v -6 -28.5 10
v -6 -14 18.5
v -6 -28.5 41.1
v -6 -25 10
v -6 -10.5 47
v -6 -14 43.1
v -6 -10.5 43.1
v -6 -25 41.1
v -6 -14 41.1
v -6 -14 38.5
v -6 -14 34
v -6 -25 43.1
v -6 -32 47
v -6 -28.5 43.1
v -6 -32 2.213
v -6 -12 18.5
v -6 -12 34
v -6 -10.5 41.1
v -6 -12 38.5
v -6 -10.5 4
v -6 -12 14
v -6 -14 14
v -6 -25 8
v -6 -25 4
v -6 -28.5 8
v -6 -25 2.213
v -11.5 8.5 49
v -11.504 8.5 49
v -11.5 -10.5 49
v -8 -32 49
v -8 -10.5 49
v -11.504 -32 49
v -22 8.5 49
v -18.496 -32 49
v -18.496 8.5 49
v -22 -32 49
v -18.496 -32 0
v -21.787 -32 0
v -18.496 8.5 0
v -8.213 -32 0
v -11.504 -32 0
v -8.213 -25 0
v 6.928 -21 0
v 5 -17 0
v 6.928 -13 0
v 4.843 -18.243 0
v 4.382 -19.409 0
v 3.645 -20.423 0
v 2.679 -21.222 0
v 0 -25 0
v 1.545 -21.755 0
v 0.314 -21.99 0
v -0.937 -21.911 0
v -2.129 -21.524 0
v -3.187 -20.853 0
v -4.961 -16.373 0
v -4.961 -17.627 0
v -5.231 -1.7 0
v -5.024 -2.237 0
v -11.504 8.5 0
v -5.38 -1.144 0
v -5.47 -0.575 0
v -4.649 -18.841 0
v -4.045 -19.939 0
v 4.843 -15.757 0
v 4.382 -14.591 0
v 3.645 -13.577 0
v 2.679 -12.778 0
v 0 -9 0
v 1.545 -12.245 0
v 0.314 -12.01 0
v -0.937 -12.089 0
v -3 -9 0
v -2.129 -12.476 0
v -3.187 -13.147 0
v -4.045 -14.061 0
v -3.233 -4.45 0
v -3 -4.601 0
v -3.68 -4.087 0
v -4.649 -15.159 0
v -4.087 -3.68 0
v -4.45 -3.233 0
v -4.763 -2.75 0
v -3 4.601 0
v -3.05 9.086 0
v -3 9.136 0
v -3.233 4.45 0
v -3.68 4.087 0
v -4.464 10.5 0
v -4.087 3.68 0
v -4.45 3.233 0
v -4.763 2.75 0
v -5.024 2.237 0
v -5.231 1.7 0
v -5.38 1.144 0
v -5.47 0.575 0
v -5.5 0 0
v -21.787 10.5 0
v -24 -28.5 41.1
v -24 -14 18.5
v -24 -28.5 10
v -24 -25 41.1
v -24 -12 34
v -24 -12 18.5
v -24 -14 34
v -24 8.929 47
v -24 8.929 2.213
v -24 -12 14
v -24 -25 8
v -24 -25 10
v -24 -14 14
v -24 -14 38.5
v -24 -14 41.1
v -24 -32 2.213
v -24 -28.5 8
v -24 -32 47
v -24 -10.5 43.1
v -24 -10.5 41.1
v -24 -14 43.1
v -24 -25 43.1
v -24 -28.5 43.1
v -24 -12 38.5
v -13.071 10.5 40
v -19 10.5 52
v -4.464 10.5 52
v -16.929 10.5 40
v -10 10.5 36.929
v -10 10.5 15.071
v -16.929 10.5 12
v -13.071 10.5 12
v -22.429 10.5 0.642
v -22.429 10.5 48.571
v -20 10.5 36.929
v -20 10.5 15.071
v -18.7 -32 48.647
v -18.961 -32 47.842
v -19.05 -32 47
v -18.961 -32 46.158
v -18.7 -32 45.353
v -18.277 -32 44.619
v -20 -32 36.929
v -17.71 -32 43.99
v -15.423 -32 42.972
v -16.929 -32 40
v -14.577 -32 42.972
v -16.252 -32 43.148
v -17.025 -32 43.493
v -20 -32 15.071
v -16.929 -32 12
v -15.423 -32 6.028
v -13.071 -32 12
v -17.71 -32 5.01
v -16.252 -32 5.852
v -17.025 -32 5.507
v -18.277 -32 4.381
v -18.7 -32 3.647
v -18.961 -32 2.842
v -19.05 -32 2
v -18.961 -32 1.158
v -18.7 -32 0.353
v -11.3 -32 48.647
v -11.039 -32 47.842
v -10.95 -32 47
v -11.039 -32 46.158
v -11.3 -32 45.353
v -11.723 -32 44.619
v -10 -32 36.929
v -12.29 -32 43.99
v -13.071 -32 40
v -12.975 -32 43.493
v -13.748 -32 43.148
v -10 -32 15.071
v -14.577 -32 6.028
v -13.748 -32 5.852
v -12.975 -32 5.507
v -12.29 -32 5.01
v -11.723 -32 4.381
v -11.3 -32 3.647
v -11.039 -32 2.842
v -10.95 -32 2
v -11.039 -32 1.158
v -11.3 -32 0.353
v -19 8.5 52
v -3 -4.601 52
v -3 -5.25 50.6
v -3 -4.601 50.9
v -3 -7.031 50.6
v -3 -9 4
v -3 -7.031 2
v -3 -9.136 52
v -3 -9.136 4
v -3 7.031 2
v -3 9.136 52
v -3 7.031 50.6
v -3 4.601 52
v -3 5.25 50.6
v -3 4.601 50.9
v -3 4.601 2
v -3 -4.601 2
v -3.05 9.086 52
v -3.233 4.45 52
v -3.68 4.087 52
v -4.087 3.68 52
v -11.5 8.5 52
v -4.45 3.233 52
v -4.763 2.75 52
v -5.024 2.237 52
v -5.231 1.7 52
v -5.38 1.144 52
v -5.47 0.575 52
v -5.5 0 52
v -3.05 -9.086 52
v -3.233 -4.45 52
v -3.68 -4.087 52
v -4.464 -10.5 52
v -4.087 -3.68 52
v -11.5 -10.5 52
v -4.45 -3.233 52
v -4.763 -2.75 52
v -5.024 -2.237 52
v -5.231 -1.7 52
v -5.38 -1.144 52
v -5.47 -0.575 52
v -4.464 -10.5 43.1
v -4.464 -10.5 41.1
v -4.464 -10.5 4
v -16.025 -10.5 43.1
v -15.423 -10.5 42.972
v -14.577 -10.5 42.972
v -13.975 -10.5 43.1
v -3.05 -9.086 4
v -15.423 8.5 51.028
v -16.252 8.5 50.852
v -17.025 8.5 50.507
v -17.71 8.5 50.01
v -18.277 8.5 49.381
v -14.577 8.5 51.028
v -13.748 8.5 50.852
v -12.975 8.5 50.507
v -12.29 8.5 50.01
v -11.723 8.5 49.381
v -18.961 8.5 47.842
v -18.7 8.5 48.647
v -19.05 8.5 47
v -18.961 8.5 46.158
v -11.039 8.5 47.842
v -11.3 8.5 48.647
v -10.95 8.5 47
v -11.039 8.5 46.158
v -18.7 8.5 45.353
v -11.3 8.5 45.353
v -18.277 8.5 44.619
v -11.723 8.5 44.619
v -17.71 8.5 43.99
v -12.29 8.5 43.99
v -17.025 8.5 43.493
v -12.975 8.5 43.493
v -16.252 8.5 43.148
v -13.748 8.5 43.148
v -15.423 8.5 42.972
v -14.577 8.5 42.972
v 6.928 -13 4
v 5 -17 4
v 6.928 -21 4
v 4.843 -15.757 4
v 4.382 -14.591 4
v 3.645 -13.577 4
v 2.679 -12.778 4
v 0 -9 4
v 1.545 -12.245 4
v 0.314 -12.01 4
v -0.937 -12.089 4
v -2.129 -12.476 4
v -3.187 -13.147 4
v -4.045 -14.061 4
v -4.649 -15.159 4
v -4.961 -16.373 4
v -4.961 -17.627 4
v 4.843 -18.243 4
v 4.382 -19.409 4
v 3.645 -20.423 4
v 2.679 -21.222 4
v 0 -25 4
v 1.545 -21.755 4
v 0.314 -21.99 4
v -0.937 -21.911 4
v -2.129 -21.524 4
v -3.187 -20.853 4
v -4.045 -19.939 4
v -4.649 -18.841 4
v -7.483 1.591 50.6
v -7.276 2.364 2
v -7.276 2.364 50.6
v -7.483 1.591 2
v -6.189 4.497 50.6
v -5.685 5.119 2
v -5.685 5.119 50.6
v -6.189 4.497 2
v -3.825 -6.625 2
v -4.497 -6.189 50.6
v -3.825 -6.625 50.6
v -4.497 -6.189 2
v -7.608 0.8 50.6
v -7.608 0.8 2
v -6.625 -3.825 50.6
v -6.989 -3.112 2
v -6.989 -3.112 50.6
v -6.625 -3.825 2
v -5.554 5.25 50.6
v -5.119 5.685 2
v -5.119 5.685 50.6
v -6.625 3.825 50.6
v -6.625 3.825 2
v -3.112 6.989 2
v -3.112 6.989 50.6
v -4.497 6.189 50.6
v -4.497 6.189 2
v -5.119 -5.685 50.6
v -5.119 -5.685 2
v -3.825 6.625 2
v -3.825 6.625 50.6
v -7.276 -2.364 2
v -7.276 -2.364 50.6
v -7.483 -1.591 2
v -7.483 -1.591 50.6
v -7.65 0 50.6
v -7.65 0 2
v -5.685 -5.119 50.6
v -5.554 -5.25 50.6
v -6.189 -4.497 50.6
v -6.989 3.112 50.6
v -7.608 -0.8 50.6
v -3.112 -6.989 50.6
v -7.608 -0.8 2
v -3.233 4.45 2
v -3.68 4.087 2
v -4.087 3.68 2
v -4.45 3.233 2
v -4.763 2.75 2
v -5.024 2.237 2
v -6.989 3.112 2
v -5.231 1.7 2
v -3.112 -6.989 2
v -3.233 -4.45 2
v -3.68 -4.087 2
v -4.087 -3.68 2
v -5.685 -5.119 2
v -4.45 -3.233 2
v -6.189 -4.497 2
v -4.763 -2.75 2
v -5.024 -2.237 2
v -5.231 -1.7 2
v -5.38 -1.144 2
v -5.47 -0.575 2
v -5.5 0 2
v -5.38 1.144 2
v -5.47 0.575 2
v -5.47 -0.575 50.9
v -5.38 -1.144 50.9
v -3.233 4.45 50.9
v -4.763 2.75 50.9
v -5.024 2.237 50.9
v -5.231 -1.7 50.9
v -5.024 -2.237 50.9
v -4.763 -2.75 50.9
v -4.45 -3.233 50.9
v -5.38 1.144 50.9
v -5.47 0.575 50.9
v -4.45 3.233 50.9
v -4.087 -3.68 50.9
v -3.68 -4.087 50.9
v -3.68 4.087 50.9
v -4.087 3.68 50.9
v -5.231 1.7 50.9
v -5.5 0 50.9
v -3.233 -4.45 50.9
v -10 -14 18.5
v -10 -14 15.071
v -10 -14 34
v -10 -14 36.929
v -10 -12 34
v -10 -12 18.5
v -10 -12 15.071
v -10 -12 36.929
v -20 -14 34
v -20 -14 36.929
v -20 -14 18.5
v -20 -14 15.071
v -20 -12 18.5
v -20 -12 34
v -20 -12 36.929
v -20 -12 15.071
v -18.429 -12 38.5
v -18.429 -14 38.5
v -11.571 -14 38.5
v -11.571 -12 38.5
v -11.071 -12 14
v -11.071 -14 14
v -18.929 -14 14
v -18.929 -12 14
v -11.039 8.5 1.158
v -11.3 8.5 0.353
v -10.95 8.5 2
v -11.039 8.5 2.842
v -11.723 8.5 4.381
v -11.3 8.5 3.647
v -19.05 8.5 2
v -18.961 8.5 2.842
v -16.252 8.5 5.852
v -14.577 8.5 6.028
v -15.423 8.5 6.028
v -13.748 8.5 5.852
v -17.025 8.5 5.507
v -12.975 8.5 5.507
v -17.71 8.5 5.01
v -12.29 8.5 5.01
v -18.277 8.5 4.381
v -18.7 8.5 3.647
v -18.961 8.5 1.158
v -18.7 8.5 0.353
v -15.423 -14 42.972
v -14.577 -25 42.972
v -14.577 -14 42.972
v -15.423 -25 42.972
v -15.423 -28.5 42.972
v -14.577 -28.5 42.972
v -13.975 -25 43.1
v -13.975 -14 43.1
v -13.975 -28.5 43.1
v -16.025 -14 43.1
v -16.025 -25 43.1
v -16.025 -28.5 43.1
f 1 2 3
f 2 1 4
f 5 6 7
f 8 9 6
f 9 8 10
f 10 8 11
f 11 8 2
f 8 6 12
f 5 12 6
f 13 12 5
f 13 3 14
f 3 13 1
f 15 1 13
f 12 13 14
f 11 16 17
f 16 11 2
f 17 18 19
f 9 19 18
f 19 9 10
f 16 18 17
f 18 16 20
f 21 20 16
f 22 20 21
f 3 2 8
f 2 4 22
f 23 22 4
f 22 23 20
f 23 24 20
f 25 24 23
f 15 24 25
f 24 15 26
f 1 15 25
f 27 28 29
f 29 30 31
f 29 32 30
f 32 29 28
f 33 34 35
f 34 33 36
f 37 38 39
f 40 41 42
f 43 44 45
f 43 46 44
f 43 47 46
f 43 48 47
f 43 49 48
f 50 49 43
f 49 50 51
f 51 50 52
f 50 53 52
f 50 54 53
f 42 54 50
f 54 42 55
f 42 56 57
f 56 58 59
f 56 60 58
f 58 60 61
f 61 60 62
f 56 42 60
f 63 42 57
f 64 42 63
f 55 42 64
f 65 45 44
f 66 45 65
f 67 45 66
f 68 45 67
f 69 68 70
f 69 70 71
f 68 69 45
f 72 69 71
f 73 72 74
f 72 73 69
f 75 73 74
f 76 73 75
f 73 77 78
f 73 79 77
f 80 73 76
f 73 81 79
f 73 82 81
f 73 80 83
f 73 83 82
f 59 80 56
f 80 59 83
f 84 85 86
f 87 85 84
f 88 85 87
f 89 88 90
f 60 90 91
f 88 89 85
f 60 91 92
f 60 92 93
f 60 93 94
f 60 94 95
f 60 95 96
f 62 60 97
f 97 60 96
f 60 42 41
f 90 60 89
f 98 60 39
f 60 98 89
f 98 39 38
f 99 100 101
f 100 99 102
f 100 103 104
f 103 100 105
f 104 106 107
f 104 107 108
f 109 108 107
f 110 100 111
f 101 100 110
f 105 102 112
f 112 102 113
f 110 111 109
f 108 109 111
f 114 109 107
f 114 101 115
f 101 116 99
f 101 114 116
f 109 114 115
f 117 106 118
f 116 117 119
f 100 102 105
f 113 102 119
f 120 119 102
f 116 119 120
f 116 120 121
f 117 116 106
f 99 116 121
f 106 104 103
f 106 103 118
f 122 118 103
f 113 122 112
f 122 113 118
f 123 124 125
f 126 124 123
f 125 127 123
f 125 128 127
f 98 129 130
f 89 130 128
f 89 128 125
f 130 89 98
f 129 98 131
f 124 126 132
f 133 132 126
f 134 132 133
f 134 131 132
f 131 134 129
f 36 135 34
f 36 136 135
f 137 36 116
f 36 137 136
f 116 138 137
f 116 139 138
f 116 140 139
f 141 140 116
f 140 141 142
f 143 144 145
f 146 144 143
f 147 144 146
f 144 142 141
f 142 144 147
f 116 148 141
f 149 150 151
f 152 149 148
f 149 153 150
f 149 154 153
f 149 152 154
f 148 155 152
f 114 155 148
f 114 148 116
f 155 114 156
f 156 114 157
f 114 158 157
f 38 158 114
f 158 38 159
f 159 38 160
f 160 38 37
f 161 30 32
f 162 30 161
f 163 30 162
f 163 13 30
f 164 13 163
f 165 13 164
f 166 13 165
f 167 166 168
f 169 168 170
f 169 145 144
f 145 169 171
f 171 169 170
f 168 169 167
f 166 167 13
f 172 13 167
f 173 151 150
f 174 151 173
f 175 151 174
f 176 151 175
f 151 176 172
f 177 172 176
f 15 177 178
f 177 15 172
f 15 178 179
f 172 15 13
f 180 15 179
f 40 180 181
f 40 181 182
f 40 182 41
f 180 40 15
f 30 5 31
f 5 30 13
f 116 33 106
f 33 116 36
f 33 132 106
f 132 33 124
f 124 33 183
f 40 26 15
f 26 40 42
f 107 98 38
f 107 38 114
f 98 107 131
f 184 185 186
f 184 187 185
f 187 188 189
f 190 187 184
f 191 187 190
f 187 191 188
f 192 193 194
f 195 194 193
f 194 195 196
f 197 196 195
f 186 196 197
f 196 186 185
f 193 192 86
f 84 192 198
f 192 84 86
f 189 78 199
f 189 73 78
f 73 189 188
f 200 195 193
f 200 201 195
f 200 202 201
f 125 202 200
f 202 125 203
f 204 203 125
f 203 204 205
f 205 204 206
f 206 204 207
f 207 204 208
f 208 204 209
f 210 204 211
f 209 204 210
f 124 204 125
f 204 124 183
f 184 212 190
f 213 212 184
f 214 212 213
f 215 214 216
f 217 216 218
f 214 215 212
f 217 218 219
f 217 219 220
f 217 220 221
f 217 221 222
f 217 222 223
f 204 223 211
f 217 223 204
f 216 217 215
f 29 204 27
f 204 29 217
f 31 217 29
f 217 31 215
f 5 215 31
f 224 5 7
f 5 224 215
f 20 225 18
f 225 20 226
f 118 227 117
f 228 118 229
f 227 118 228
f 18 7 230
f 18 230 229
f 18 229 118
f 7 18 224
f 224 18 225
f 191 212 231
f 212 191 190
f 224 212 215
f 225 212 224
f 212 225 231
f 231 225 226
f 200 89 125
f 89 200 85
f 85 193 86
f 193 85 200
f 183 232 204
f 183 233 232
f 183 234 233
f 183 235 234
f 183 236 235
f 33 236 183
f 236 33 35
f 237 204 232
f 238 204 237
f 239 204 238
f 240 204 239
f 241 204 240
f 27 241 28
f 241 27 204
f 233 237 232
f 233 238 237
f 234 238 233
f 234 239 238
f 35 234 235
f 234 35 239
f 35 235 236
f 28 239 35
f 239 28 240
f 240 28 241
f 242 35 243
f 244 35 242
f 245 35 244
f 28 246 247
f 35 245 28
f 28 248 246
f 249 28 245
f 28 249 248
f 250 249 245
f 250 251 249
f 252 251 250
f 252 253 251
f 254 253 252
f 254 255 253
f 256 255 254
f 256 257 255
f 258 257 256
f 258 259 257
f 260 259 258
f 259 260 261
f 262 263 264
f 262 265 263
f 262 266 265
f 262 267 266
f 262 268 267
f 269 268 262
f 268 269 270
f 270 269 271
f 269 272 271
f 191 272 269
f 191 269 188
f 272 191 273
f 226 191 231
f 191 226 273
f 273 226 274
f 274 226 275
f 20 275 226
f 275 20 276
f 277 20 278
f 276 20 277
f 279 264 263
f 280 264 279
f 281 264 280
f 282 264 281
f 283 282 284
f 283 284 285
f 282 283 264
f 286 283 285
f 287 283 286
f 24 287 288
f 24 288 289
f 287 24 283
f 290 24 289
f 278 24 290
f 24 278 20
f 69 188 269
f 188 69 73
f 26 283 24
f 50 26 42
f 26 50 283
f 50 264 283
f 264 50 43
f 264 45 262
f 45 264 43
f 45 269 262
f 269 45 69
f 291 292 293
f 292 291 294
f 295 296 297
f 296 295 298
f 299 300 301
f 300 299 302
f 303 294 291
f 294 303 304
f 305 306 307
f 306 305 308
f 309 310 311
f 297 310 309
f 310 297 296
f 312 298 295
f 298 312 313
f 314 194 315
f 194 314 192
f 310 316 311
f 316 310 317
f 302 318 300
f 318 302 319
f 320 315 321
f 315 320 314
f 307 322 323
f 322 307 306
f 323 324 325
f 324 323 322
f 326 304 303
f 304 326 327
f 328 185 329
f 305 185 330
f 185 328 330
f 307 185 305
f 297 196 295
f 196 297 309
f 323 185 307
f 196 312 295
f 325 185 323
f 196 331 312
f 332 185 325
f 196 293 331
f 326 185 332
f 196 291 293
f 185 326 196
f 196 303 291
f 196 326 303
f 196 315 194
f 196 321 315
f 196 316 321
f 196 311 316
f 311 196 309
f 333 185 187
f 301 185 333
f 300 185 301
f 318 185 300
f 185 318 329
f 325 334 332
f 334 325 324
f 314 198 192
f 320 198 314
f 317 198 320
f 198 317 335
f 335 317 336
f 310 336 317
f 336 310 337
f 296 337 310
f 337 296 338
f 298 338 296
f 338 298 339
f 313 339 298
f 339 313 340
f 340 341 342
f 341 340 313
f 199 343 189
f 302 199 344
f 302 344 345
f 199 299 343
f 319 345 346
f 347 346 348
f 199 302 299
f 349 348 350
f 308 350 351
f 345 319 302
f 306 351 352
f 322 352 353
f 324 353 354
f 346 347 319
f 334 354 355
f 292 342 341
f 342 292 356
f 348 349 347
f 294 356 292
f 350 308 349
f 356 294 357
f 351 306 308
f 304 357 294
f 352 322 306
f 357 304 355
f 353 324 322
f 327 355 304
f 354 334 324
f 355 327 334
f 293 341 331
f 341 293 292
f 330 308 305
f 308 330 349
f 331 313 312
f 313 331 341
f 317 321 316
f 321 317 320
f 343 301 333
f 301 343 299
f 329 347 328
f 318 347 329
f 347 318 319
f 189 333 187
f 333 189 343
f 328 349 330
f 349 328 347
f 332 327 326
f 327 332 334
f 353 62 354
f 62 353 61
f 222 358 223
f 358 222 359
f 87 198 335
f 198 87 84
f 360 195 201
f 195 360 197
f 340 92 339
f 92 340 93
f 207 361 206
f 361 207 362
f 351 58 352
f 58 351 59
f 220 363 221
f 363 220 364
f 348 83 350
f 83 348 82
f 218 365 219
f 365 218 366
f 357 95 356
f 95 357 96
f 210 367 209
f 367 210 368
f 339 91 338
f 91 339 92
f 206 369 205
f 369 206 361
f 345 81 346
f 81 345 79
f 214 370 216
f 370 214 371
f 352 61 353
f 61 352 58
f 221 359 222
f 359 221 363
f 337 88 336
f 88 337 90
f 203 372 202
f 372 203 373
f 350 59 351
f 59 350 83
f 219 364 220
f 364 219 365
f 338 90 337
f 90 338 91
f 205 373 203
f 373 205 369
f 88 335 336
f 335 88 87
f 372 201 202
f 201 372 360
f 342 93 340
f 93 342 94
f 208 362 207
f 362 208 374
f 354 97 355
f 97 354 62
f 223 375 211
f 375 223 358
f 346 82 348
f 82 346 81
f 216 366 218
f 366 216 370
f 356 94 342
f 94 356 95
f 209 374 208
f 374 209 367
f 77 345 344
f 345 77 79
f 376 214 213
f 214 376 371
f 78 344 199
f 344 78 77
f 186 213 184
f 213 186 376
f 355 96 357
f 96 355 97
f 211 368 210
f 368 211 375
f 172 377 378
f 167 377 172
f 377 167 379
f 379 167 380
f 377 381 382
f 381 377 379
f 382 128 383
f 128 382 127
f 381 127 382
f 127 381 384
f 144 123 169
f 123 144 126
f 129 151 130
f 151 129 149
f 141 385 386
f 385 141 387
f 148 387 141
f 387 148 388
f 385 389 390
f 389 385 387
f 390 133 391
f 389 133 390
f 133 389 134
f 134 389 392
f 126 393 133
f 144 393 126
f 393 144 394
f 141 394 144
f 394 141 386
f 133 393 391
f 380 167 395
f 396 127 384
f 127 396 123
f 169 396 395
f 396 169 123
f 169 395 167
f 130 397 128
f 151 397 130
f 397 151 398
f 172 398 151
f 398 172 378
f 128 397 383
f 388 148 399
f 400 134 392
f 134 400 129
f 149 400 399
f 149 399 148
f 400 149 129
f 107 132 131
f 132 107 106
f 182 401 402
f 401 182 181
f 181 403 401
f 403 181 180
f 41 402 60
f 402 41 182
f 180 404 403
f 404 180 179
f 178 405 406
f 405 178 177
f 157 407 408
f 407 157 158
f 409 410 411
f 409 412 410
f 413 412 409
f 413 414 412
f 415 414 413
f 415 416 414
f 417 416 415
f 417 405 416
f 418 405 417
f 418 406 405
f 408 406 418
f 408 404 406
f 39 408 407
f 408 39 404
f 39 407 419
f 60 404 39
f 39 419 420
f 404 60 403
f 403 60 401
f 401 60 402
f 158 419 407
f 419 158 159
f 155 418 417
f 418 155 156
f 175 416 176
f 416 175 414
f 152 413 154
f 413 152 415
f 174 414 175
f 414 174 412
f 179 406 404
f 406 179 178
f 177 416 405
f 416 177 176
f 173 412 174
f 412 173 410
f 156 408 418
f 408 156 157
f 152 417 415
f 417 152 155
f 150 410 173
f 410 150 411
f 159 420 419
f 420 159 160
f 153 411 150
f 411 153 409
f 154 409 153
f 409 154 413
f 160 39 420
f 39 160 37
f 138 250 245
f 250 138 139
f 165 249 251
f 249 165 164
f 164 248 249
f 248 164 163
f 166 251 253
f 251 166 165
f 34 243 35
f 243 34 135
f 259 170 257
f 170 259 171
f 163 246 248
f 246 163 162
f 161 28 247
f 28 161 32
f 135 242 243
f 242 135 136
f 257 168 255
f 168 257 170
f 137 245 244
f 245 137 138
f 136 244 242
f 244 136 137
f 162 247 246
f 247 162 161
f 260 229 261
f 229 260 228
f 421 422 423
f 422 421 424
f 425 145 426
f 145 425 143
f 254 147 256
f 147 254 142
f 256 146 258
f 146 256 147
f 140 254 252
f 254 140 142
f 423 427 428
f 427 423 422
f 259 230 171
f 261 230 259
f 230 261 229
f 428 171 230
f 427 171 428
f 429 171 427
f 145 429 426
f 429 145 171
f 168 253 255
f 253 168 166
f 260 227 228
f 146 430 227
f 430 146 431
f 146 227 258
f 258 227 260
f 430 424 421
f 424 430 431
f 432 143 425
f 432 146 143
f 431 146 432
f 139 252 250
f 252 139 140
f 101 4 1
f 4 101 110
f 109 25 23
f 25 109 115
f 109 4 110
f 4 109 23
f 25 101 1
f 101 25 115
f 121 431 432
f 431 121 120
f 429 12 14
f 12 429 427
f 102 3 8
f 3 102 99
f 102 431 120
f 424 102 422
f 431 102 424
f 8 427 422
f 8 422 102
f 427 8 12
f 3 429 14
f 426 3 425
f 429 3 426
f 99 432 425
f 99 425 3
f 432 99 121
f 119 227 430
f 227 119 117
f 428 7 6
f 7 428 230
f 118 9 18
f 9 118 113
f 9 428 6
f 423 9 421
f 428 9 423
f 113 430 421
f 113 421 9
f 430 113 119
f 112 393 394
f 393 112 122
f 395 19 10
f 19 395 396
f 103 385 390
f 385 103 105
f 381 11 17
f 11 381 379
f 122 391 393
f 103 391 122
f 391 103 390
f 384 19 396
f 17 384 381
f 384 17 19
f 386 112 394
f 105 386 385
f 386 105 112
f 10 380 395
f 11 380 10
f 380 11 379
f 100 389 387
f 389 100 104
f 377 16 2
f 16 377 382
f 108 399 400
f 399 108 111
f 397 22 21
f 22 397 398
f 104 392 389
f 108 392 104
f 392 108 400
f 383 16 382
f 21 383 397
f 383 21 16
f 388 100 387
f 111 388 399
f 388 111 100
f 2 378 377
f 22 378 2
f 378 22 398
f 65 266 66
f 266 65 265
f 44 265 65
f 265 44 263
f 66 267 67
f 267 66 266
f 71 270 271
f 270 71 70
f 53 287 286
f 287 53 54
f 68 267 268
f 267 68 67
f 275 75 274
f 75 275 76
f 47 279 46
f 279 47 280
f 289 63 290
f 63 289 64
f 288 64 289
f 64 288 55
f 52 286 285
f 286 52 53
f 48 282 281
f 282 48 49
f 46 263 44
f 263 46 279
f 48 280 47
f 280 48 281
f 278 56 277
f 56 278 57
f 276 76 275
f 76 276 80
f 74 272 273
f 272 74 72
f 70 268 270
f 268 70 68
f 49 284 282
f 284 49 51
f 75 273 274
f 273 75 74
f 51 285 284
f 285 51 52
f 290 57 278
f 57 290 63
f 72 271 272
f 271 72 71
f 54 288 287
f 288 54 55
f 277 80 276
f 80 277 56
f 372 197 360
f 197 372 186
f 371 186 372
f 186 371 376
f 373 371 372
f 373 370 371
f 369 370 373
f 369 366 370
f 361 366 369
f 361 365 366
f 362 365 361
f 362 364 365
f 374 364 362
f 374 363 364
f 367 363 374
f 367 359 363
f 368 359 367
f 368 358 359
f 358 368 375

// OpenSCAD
// file: bearing.scad
// PRUSA iteration3
// Bearing holders
// GNU GPL v3
// Josef Průša <iam@josefprusa.cz> and contributors
// http://www.reprap.org/wiki/Prusa_Mendel
// http://prusamendel.org

bearing_diameter = 15;
thinwall = 3;
bearing_size = bearing_diameter + 2 * thinwall;
tolerance = 0.15;
bearing_height = 52;

module horizontal_bearing_base(bearings=1) {
  translate(v=[0,0,6]) cube(size = [24,8+bearings*25,12], center = true);
}

module horizontal_bearing_holes(bearings=1) {
  cutter_lenght = 10+bearings*25;
  one_holder_lenght = 8+25;
  holder_lenght = 8+bearings*25;

  // Main bearing cut
  difference() {
    translate(v = [0,0,12]) rotate(a = [90,0,0]) translate(v = [0,0,-cutter_lenght/2]) cylinder(h = cutter_lenght, r = bearing_diameter/2, $fn = 50);
    // Bearing retainers
    translate(v=[0,1-holder_lenght/2,3]) cube(size = [24,6,8], center = true);
    translate(v=[0,-1+holder_lenght/2,3]) cube(size = [24,6,8], center = true);
  }

  // Ziptie cutouts
  ziptie_cut_ofset = 0;

  for (i = [0:bearings-1]) {
    // For easier positioning I move them by half of one
    // bearing holder then add each bearign lenght and then center again
    translate(v = [0,-holder_lenght/2,0]) translate(v = [0,one_holder_lenght/2+i*25,0]) difference(){
      union(){
        translate(v = [0,2-6,12]) rotate(a = [90,0,0]) translate(v = [0,0,0]) cylinder(h = 4, r = 12.5, $fn = 50);
        translate(v = [0,2+6,12]) rotate(a = [90,0,0]) translate(v = [0,0,0]) cylinder(h = 4, r = 12.5, $fn = 50);
      }
      translate(v = [0,10,12]) rotate(a = [90,0,0]) translate(v = [0,0,0]) cylinder(h = 24, r = 10, $fn = 50);
    }
  }
}

module horizontal_bearing_test() {
  difference(){
    horizontal_bearing_base(1);
    horizontal_bearing_holes(1);
  }
  translate(v=[30,0,0]) difference(){
    horizontal_bearing_base(2);
    horizontal_bearing_holes(2);
  }
  translate(v=[60,0,0]) difference(){
    horizontal_bearing_base(3);
    horizontal_bearing_holes(3);
  }
}



module vertical_bearing_base(height) {
  translate(v = [-bearing_size/2-3,bearing_size/2-1,height-2.5]) cube(size = [17,2,5], center = true);
  difference(){
  translate(v = [-2-bearing_size/4,0,height/2]) cube(size = [bearing_size/2-2,bearing_size,height], center = true);
  //cylinder(h = height, r=bearing_size/2, $fn = 90);
    //nice edge
   translate (v = [2.2-bearing_size/4,-bearing_size/2,height/2]) rotate ([0,0,45]) cube(size=[2,2,60],center=true);
   translate (v = [2.2-bearing_size/4,bearing_size/2,height/2]) rotate ([0,0,45]) cube(size=[2,2,60],center=true);  //translate(v = [-2-bearing_size/4,0,height/2]) 
  }    
}

module vertical_bearing_holes(height) {
  
  translate(v = [0,0,2]) cylinder(h = height+tolerance*2, r = bearing_diameter/2+tolerance, $fn = 60);
    //translate(v = [-bearing_diameter/2,0,height/2]) cube([4,bearing_diameter+2,10], center = true);
   translate(v = [0,0,-2]) cylinder(h = height*2, r = bearing_diameter/2-2, $fn = 60);
  
}

difference() {
  vertical_bearing_base(bearing_height);
  vertical_bearing_holes(bearing_height-3.70);
    
 }
translate(v = [-2-bearing_size/4,0,bearing_height-2]) cube(size = [bearing_size/2-2,bearing_size/2,tolerance*2], center = true) ;
//vertical_bearing_holes(50);
// main file
// PRUSA iteration3
// X end prototype
// GNU GPL v3
// Josef Průša <iam@josefprusa.cz> and contributors
// http://www.reprap.org/wiki/Prusa_Mendel
// http://prusamendel.org

use <bearing.scad>
rod_distance = 45;
m5_tolerance = 0.3;
//bearings
bearing_diameter = 15;
thinwall = 3;
bearing_size = bearing_diameter + 2 * thinwall;
tolerance = 0.15;
bearing_height = 52;
smooth_rod_diam=8;
smooth_rod_diam_tolerance=0.1;

module x_end_base() {
  // Main block
  height = 49;

  difference() {
    translate(v = [-15,-9-3.5/2,height/2]) cube(size = [18,39+3.5,height], center = true);
    // Top corners cutouts
    translate([-15+7,-20,51-2]) rotate([0,45,0]) translate([-15,-15,0]) cube([30,60,30]);
    translate([-15-18+11,-20,51-2]) rotate([0,-45,0]) translate([-15,-15,0]) cube([30,60,30]);
    // Bottom corners cutout
    translate([-15+7,-20,-19-2]) rotate([0,45,0]) translate([-15,-15,0]) cube([30,60,30]);
    translate([-15-18+11,-20,-19-2]) rotate([0,-45,0]) translate([-15,-15,0]) cube([30,60,30]);
  }

  // Bearing holder
  difference(){
    vertical_bearing_base(bearing_height);
        translate([-15-18+11,-20,51-2]) rotate([0,-45,0]) translate([-15,-15,0]) cube([30,60,30]);
  
  }
  // Nut trap
  // Cube
  translate(v = [-2-2-1,-17,2]) cube(size = [8+2,16,4], center = true);
  // Hexagon
  translate(v = [0,-17,0]) rotate([0,0,30]) cylinder(h = 4, r = 8, $fn = 6);
}

module x_end_holes() {
  vertical_bearing_holes(bearing_height-3.70);

  // Belt hole
  translate(v = [-1,0,-4])

  difference() {
    translate(v = [-5.5-10+1.5,-10,30]) cube(size = [10,46,28], center = true);

  	// Nice edges
  	translate(v = [-5.5-10+1.5,-10,30+23]) rotate([0,45,0]) cube(size = [10,46,28], center = true);
  	translate(v = [-5.5-10+1.5,-10,30+23]) rotate([0,-45,0]) cube(size = [10,46,28], center = true);
  	translate(v = [-5.5-10+1.5,-10,30-23]) rotate([0,45,0]) cube(size = [10,46,28], center = true);
  	translate(v = [-5.5-10+1.5,-10,30-23]) rotate([0,-45,0]) cube(size = [10,46,28], center = true);
      
      

}
translate(v = [-40,0,25]) rotate([0,0,45]) cube(size = [46,10,56], center = true);
  // Bottom pushfit rod
  translate(v = [-15,-41.5,2]) rotate(a = [-90,0,0]) pushfit_rod(smooth_rod_diam+smooth_rod_diam_tolerance,50);

  // Top pushfit rod
  translate(v = [-15,-41.5,rod_distance+2]) rotate(a = [-90,0,0]) pushfit_rod(smooth_rod_diam+smooth_rod_diam_tolerance,50);

  // Ziptie for holding smooth rods
  translate([-30,-28.5,8]) cube([30,3.5,2]);
  translate([-30,-28.5,49-6-1.9]) cube([30,3.5,2]);
  translate([-30,-14,49-6-1.9]) cube([30,3.5,2]);


  // Ziptie for holding bearings
  translate([-30,-14,bearing_height-2-16]) cube([30,2,4.5]);
  translate([-30,-14,2+12]) cube([30,2,4.5]);
  translate([-30,+12,bearing_height-2-16]) cube([30,2,4.5]);
  translate([-30,+12,2+12]) cube([30,2,4.5]);

  // Nut trap removed : leadswcrew is free! 
  translate(v = [0,-17,-0.5]) cylinder(h = 15, r = 5, $fn = 25);
  //translate(v = [0,-17,3]) rotate([0,0,30]) cylinder(h = 10, r=4.5+m5_tolerance/2, $fn = 6);
}

// Final prototype
module x_end_plain() {
  difference() {
    x_end_base();
    x_end_holes();
  }
  //embedded support for top bearing cap:
  translate(v = [-2-bearing_size/4,0,bearing_height-1.25 ]) cube(size = [bearing_size/2-2,bearing_size/2,tolerance*2], center = true) ;

}

x_end_plain();

module pushfit_rod(diameter,length) {
  cylinder(h = length, r = diameter/2, $fn = 30);
  /*difference() {
 	  translate(v = [0,-diameter/2.85,length/2]) rotate([0,0,45]) cube(size = [diameter/2,diameter/2,length], center = true);
 	  translate(v = [0,-diameter/4-diameter/2-0.4,length/2]) rotate([0,0,0]) cube(size = [diameter,diameter/2,length], center = true);
  }*/
  //translate(v=[0,-diameter/2-2,length/2]) cube(size = [diameter,1,length], center = true);
}
